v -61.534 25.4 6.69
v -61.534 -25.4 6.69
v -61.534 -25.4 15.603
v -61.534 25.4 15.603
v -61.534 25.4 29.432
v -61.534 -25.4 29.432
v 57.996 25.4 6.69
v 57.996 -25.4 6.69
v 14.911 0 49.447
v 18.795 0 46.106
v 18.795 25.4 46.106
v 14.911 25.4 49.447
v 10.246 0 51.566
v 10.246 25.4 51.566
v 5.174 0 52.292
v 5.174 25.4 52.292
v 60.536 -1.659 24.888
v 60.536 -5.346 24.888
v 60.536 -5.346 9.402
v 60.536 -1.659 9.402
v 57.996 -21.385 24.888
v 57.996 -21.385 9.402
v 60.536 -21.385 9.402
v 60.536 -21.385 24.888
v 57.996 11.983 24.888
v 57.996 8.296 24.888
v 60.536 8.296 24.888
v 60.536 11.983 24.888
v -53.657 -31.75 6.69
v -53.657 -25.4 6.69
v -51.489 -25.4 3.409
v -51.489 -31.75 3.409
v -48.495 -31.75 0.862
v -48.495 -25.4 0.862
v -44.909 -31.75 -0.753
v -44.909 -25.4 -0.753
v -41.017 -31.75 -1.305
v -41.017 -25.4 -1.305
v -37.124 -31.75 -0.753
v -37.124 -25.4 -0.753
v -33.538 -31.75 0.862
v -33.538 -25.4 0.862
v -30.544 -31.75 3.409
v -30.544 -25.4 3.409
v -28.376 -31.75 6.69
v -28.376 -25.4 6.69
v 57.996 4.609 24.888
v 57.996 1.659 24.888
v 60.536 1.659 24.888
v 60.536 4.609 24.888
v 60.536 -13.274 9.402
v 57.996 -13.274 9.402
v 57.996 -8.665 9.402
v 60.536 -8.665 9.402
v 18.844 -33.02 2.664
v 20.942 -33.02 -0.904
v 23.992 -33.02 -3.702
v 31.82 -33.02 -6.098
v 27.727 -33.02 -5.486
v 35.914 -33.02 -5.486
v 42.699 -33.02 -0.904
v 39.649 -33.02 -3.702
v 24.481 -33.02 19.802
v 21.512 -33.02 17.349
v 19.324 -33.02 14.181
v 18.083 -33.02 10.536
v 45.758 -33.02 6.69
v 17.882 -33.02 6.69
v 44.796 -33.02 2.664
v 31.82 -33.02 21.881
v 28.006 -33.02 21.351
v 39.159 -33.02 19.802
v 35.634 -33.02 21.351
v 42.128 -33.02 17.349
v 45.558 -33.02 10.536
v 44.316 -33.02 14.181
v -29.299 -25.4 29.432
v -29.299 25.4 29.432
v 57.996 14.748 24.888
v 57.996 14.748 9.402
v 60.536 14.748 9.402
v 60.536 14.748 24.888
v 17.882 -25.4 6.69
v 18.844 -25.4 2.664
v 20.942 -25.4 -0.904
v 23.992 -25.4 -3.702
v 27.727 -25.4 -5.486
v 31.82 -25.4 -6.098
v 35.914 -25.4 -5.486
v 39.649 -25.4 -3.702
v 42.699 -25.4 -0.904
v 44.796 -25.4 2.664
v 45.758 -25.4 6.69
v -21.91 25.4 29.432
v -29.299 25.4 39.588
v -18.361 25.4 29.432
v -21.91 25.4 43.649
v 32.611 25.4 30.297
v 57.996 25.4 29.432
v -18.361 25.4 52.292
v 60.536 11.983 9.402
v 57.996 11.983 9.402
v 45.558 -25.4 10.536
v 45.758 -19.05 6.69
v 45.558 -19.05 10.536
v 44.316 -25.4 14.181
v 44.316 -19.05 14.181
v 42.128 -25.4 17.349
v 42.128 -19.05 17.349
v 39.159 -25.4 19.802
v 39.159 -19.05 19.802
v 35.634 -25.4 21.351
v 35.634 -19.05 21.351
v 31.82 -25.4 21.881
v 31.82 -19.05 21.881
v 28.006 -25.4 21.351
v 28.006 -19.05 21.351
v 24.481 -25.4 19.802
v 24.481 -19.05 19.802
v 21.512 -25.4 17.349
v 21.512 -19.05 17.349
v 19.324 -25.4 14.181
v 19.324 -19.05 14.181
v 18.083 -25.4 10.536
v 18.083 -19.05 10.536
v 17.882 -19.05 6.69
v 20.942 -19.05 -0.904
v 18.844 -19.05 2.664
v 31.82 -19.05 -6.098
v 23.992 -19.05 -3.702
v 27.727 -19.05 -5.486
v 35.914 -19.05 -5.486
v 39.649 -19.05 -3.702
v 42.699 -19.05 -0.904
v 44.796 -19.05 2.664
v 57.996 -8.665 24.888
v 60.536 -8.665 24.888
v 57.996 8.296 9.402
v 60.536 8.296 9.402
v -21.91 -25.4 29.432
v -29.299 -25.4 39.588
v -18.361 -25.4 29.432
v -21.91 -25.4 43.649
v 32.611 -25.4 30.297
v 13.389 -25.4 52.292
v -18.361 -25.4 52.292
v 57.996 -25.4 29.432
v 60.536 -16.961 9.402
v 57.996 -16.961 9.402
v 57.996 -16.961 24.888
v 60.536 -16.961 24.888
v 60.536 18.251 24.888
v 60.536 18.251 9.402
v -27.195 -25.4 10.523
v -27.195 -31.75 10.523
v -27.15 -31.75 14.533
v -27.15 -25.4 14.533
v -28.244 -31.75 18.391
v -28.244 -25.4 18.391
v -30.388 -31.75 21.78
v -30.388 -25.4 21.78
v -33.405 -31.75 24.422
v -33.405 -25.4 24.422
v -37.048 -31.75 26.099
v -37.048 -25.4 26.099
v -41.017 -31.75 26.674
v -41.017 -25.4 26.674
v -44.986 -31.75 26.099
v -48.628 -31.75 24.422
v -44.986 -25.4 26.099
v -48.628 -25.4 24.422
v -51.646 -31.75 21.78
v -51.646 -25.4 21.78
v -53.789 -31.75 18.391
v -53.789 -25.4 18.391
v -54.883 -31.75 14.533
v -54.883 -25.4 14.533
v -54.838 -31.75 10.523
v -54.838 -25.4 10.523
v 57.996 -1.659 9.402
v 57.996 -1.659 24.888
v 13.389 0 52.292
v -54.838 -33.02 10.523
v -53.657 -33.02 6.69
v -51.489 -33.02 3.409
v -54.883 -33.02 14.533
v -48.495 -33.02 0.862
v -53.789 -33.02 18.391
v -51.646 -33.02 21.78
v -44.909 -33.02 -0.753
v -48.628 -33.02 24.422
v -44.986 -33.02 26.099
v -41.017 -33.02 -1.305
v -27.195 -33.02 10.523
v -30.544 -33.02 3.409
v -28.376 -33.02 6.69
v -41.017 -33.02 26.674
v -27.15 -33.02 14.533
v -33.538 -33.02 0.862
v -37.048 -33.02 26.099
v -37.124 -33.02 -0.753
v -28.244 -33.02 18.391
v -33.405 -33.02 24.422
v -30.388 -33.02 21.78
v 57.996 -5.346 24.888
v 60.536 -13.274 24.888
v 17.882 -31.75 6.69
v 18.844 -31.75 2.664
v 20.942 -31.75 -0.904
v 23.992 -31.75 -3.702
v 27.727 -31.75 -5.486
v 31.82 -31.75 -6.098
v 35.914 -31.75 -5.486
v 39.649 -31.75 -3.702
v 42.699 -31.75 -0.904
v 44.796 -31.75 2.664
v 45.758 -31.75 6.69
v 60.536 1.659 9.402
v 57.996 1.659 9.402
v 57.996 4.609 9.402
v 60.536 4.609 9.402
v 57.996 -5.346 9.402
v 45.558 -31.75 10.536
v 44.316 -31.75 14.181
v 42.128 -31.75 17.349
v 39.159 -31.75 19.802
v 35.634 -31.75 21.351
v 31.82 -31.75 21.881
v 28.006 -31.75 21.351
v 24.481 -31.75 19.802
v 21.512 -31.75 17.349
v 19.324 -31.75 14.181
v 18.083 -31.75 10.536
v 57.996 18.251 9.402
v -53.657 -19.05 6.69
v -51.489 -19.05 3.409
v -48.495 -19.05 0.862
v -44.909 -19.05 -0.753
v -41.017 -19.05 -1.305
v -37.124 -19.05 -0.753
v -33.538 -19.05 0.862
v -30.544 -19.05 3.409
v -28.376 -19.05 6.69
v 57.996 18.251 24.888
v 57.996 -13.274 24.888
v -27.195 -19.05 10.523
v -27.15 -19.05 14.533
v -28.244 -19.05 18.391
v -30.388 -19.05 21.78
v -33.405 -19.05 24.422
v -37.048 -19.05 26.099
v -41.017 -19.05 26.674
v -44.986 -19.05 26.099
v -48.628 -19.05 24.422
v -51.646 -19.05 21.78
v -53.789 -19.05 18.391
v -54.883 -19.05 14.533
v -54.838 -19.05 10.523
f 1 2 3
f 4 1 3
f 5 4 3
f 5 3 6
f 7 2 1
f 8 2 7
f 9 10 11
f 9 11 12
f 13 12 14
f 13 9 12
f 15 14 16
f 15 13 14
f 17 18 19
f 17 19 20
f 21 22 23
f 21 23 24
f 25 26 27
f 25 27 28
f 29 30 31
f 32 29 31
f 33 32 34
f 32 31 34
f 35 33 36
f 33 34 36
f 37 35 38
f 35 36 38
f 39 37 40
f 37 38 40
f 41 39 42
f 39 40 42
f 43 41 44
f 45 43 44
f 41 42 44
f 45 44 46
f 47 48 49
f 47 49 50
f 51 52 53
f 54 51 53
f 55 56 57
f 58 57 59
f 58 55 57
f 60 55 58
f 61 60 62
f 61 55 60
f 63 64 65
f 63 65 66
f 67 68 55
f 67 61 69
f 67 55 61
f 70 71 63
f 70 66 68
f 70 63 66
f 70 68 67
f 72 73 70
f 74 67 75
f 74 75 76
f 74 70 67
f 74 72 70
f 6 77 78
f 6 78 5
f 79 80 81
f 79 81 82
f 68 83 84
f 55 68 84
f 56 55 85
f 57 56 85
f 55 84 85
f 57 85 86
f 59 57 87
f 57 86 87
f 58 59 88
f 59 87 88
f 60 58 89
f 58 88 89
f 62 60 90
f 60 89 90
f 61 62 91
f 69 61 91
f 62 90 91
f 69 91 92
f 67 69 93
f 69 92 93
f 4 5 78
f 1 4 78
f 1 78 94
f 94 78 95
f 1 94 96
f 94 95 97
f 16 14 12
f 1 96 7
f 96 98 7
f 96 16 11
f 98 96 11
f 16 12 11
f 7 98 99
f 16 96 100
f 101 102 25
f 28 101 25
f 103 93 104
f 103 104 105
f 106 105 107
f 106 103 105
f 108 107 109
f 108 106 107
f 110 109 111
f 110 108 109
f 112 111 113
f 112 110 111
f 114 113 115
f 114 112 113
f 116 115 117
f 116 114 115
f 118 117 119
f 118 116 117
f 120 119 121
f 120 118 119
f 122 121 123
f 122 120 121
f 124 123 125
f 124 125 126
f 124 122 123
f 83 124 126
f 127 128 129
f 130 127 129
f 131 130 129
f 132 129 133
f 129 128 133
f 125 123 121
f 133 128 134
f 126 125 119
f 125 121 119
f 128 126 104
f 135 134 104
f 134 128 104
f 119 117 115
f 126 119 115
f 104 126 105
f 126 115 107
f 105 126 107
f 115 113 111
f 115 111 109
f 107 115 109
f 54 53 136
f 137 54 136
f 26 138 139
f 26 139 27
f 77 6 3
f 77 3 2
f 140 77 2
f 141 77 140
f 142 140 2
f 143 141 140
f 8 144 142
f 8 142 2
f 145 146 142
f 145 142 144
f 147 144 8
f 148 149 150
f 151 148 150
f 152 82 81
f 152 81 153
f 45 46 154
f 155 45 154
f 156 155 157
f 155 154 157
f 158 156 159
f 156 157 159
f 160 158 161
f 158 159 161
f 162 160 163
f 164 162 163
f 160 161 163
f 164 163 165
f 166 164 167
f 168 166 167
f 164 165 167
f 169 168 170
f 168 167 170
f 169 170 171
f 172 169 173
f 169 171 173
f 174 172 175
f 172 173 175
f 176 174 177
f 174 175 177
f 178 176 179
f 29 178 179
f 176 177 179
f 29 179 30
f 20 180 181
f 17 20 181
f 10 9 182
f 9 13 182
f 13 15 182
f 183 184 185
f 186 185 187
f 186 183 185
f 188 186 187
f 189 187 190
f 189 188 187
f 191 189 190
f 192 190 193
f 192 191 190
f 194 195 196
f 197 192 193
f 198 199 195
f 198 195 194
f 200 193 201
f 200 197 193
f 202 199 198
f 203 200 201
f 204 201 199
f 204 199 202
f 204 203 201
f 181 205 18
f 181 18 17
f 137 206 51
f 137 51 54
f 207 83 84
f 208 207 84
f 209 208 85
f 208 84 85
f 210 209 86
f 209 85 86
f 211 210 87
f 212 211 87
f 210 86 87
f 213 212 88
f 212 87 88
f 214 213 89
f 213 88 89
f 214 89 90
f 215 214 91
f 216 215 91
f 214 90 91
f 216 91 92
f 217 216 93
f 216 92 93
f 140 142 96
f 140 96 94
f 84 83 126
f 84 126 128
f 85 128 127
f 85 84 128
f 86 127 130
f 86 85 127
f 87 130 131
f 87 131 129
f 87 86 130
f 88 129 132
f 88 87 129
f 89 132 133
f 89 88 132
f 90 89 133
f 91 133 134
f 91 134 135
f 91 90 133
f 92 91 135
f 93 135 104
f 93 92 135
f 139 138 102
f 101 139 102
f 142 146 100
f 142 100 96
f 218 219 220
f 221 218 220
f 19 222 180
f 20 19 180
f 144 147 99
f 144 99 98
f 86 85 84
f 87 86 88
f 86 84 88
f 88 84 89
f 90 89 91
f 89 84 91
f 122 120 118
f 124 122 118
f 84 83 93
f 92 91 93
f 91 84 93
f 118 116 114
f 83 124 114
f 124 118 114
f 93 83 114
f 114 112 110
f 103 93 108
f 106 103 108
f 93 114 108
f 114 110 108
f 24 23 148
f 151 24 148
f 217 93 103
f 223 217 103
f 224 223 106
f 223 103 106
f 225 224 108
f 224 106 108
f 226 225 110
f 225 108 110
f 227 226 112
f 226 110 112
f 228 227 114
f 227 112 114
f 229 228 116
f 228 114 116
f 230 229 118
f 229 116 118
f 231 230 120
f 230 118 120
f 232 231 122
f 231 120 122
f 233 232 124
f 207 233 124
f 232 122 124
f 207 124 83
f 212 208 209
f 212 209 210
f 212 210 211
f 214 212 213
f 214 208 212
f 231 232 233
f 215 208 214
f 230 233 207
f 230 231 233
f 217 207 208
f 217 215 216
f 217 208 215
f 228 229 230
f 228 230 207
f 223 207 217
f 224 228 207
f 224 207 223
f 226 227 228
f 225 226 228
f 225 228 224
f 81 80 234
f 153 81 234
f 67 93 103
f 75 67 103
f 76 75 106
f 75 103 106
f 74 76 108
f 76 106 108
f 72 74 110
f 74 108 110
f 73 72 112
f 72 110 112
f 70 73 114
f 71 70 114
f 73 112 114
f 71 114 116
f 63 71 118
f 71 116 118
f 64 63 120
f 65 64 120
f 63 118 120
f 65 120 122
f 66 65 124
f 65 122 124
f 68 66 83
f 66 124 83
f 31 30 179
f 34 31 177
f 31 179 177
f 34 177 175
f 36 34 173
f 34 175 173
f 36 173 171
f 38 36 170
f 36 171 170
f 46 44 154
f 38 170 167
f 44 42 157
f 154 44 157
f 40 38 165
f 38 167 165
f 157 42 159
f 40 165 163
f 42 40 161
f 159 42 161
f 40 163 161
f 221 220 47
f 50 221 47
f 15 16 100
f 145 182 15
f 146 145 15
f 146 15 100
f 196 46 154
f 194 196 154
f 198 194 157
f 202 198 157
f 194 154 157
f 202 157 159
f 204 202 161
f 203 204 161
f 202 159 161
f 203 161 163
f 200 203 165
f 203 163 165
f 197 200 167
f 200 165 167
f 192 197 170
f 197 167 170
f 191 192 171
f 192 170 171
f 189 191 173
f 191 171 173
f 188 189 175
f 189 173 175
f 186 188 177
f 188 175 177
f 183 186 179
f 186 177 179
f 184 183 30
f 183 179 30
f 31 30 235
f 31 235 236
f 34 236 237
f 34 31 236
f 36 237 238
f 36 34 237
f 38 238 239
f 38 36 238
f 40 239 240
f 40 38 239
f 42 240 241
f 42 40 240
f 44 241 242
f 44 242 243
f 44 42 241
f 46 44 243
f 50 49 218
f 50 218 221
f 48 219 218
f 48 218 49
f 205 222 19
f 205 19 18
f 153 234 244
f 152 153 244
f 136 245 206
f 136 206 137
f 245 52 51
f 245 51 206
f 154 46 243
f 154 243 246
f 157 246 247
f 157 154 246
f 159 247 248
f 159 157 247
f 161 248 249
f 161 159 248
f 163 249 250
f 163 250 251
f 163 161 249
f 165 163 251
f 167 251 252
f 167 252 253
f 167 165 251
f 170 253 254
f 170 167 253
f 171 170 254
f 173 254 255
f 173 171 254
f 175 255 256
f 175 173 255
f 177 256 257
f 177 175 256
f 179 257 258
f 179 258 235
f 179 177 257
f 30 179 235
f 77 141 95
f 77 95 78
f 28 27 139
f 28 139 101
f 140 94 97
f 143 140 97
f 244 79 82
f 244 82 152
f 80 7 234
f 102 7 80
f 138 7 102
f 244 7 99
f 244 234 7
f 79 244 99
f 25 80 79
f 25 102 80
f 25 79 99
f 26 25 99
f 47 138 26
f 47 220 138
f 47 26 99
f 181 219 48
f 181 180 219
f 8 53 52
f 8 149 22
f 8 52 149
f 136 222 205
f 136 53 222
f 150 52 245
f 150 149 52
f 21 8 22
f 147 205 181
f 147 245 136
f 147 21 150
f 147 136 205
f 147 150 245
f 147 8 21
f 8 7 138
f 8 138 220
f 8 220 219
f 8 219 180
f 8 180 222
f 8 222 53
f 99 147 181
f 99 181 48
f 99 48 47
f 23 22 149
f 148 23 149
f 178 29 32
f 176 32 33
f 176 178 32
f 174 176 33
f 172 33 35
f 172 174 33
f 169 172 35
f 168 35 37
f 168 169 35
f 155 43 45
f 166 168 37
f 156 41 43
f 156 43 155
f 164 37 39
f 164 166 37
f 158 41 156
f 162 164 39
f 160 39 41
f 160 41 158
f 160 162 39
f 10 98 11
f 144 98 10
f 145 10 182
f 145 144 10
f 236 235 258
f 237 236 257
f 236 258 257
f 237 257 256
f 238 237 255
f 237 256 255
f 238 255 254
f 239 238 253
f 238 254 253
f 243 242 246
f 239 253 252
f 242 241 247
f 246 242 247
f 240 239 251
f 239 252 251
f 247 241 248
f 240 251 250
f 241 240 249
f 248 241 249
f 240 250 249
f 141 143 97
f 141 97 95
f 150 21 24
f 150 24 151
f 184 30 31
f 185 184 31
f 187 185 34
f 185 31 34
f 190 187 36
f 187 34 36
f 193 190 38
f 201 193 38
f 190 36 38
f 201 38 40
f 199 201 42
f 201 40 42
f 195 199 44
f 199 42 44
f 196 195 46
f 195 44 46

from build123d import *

# Parameters (mm, degrees)
F0_W      = 6.5593134881
F0_H      = 8.9133062686
F1_DEPTH  = 25.4
F3_DEPTH  = 6.35
F4_R      = 18.0901122542
F5_W      = 4.4245161116
F5_H      = 15.4858082533
F5_W_2    = 4.6088704839
F5_W_3    = 3.6870974582
F5_W_4    = 2.9496757779
F5_W_5    = 3.6870958284
F5_W_6    = 3.502741456
F6_DEPTH  = 2.54
F7_DEPTH  = 25.4
F9_DEPTH  = 6.35
F10_DEPTH = 7.62


with BuildPart() as f1:
    # F0 (on Front) → F1 (new body, symmetric)
    with BuildSketch(Plane.XZ):
        Polygon((-54.9742393196, 6.6901401331), (-43.815, 6.6901401331), (-22.225, 6.6901401331), (22.225, 6.6901401331), (43.815, 6.6901401331), (57.996344903, 6.6901401331), (57.996344903, 21.7543058097), (57.996344903, 29.4315865307), (32.6111048418, 30.2973734773), (13.3892763085, 52.2915865307), (-18.3607236915, 52.2915865307), (-18.3607236915, 29.4315865307), (-21.9099149108, 29.4315865307), (-29.2985904962, 29.4315865307), (-61.5335528077, 29.4315865307), (-61.5335528077, 15.6034464017), (-54.9742393196, 15.6034464017), align=None)
        with Locations((-58.2538960636, 11.1467932674)):
            Rectangle(F0_W, F0_H)
        Polygon((-29.2985904962, 39.587803185), (-29.2985904962, 29.4315865307), (-21.9099149108, 29.4315865307), (-21.9099149108, 43.6486341059), align=None)
    extrude(amount=F1_DEPTH, both=True)

    # F2 (on face) → F3 (cut)
    with BuildSketch(Plane.XZ.offset(25.4)):
        Polygon((12.8608942032, 49.0364283323), (-14.8549089208, 49.0364283323), (-14.8549089208, 30.4625499994), (27.4568814784, 30.4625499994), align=None)
    extrude(amount=-F3_DEPTH, mode=Mode.SUBTRACT)

    # F4
    f4_edges = [f1.edges().sort_by_distance(p)[0] for p in [
        (13.389276, 0, 52.291587),
    ]]
    fillet(f4_edges, radius=F4_R)

    # F5 (on face) → F6 (join)
    with BuildSketch(Plane.YZ.offset(57.996344903)):
        with Locations((-19.1729031503, 17.1450003982)):
            Rectangle(F5_W, F5_H)
        with Locations((-10.9691130929, 17.1450003982)):
            Rectangle(F5_W_2, F5_H)
        with Locations((-3.5027425038, 17.1450003982)):
            Rectangle(F5_W_3, F5_H)
        with Locations((3.1340321293, 17.1450003982)):
            Rectangle(F5_W_4, F5_H)
        with Locations((10.1395170204, 17.1450003982)):
            Rectangle(F5_W_5, F5_H)
        with Locations((16.4997577667, 17.1450003982)):
            Rectangle(F5_W_6, F5_H)
    extrude(amount=F6_DEPTH)

    # F0 (on Front) → F7 (join)
    with BuildSketch(Plane.XZ):
        Polygon((-54.9742393196, 6.6901401331), (-43.815, 6.6901401331), (-22.225, 6.6901401331), (22.225, 6.6901401331), (43.815, 6.6901401331), (57.996344903, 6.6901401331), (57.996344903, 21.7543058097), (57.996344903, 29.4315865307), (32.6111048418, 30.2973734773), (13.3892763085, 52.2915865307), (-18.3607236915, 52.2915865307), (-18.3607236915, 29.4315865307), (-21.9099149108, 29.4315865307), (-29.2985904962, 29.4315865307), (-61.5335528077, 29.4315865307), (-61.5335528077, 15.6034464017), (-54.9742393196, 15.6034464017), align=None)
        with Locations((-58.2538960636, 11.1467932674)):
            Rectangle(F0_W, F0_H)
        Polygon((-29.2985904962, 39.587803185), (-29.2985904962, 29.4315865307), (-21.9099149108, 29.4315865307), (-21.9099149108, 43.6486341059), align=None)
    extrude(amount=F7_DEPTH)


with BuildPart() as f9:
    # F8 (on face) → F9 (new body, symmetric)
    with BuildSketch(Plane.XZ.offset(25.4)):
        with BuildLine():
            Line((-28.3763644468, 6.6901401331), (-53.6567698276, 6.6901401331))
            ThreePointArc((-53.6567698276, 6.6901401331), (-41.0165671372, -1.3050641796), (-28.3763644468, 6.6901401331))
        make_face()
        with BuildLine():
            ThreePointArc((-28.3763644468, 6.6901401331), (-41.0165671372, 26.6739601588), (-53.6567698276, 6.6901401331))
            Line((-53.6567698276, 6.6901401331), (-28.3763644468, 6.6901401331))
        make_face()
    extrude(amount=F9_DEPTH, both=True)


with BuildPart() as f9b:
    # F8 (on face) → F9, piece 2 (new body, symmetric)
    with BuildSketch(Plane.XZ.offset(25.4)):
        with BuildLine():
            ThreePointArc((45.7580525282, 6.6901401331), (31.8202361392, 21.8812033987), (17.8824197501, 6.6901401331))
            Line((17.8824197501, 6.6901401331), (45.7580525282, 6.6901401331))
        make_face()
        with BuildLine():
            Line((45.7580525282, 6.6901401331), (17.8824197501, 6.6901401331))
            ThreePointArc((17.8824197501, 6.6901401331), (31.8202361392, -6.0978209398), (45.7580525282, 6.6901401331))
        make_face()
    extrude(amount=F9_DEPTH, both=True)


with BuildPart() as f10:
    # F8 (on face) → F10 (new body)
    with BuildSketch(Plane.XZ.offset(25.4)):
        with BuildLine():
            ThreePointArc((-28.3763644468, 6.6901401331), (-41.0165671372, 26.6739601588), (-53.6567698276, 6.6901401331))
            ThreePointArc((-53.6567698276, 6.6901401331), (-41.0165671372, -1.3050641796), (-28.3763644468, 6.6901401331))
        make_face()
    extrude(amount=F10_DEPTH)


with BuildPart() as f10b:
    # F8 (on face) → F10, piece 2 (new body)
    with BuildSketch(Plane.XZ.offset(25.4)):
        with BuildLine():
            ThreePointArc((45.7580525282, 6.6901401331), (31.8202361392, 21.8812033987), (17.8824197501, 6.6901401331))
            ThreePointArc((17.8824197501, 6.6901401331), (31.8202361392, -6.0978209398), (45.7580525282, 6.6901401331))
        make_face()
    extrude(amount=F10_DEPTH)


solid = Compound([f1.part, f9.part, f9b.part, f10.part, f10b.part])
